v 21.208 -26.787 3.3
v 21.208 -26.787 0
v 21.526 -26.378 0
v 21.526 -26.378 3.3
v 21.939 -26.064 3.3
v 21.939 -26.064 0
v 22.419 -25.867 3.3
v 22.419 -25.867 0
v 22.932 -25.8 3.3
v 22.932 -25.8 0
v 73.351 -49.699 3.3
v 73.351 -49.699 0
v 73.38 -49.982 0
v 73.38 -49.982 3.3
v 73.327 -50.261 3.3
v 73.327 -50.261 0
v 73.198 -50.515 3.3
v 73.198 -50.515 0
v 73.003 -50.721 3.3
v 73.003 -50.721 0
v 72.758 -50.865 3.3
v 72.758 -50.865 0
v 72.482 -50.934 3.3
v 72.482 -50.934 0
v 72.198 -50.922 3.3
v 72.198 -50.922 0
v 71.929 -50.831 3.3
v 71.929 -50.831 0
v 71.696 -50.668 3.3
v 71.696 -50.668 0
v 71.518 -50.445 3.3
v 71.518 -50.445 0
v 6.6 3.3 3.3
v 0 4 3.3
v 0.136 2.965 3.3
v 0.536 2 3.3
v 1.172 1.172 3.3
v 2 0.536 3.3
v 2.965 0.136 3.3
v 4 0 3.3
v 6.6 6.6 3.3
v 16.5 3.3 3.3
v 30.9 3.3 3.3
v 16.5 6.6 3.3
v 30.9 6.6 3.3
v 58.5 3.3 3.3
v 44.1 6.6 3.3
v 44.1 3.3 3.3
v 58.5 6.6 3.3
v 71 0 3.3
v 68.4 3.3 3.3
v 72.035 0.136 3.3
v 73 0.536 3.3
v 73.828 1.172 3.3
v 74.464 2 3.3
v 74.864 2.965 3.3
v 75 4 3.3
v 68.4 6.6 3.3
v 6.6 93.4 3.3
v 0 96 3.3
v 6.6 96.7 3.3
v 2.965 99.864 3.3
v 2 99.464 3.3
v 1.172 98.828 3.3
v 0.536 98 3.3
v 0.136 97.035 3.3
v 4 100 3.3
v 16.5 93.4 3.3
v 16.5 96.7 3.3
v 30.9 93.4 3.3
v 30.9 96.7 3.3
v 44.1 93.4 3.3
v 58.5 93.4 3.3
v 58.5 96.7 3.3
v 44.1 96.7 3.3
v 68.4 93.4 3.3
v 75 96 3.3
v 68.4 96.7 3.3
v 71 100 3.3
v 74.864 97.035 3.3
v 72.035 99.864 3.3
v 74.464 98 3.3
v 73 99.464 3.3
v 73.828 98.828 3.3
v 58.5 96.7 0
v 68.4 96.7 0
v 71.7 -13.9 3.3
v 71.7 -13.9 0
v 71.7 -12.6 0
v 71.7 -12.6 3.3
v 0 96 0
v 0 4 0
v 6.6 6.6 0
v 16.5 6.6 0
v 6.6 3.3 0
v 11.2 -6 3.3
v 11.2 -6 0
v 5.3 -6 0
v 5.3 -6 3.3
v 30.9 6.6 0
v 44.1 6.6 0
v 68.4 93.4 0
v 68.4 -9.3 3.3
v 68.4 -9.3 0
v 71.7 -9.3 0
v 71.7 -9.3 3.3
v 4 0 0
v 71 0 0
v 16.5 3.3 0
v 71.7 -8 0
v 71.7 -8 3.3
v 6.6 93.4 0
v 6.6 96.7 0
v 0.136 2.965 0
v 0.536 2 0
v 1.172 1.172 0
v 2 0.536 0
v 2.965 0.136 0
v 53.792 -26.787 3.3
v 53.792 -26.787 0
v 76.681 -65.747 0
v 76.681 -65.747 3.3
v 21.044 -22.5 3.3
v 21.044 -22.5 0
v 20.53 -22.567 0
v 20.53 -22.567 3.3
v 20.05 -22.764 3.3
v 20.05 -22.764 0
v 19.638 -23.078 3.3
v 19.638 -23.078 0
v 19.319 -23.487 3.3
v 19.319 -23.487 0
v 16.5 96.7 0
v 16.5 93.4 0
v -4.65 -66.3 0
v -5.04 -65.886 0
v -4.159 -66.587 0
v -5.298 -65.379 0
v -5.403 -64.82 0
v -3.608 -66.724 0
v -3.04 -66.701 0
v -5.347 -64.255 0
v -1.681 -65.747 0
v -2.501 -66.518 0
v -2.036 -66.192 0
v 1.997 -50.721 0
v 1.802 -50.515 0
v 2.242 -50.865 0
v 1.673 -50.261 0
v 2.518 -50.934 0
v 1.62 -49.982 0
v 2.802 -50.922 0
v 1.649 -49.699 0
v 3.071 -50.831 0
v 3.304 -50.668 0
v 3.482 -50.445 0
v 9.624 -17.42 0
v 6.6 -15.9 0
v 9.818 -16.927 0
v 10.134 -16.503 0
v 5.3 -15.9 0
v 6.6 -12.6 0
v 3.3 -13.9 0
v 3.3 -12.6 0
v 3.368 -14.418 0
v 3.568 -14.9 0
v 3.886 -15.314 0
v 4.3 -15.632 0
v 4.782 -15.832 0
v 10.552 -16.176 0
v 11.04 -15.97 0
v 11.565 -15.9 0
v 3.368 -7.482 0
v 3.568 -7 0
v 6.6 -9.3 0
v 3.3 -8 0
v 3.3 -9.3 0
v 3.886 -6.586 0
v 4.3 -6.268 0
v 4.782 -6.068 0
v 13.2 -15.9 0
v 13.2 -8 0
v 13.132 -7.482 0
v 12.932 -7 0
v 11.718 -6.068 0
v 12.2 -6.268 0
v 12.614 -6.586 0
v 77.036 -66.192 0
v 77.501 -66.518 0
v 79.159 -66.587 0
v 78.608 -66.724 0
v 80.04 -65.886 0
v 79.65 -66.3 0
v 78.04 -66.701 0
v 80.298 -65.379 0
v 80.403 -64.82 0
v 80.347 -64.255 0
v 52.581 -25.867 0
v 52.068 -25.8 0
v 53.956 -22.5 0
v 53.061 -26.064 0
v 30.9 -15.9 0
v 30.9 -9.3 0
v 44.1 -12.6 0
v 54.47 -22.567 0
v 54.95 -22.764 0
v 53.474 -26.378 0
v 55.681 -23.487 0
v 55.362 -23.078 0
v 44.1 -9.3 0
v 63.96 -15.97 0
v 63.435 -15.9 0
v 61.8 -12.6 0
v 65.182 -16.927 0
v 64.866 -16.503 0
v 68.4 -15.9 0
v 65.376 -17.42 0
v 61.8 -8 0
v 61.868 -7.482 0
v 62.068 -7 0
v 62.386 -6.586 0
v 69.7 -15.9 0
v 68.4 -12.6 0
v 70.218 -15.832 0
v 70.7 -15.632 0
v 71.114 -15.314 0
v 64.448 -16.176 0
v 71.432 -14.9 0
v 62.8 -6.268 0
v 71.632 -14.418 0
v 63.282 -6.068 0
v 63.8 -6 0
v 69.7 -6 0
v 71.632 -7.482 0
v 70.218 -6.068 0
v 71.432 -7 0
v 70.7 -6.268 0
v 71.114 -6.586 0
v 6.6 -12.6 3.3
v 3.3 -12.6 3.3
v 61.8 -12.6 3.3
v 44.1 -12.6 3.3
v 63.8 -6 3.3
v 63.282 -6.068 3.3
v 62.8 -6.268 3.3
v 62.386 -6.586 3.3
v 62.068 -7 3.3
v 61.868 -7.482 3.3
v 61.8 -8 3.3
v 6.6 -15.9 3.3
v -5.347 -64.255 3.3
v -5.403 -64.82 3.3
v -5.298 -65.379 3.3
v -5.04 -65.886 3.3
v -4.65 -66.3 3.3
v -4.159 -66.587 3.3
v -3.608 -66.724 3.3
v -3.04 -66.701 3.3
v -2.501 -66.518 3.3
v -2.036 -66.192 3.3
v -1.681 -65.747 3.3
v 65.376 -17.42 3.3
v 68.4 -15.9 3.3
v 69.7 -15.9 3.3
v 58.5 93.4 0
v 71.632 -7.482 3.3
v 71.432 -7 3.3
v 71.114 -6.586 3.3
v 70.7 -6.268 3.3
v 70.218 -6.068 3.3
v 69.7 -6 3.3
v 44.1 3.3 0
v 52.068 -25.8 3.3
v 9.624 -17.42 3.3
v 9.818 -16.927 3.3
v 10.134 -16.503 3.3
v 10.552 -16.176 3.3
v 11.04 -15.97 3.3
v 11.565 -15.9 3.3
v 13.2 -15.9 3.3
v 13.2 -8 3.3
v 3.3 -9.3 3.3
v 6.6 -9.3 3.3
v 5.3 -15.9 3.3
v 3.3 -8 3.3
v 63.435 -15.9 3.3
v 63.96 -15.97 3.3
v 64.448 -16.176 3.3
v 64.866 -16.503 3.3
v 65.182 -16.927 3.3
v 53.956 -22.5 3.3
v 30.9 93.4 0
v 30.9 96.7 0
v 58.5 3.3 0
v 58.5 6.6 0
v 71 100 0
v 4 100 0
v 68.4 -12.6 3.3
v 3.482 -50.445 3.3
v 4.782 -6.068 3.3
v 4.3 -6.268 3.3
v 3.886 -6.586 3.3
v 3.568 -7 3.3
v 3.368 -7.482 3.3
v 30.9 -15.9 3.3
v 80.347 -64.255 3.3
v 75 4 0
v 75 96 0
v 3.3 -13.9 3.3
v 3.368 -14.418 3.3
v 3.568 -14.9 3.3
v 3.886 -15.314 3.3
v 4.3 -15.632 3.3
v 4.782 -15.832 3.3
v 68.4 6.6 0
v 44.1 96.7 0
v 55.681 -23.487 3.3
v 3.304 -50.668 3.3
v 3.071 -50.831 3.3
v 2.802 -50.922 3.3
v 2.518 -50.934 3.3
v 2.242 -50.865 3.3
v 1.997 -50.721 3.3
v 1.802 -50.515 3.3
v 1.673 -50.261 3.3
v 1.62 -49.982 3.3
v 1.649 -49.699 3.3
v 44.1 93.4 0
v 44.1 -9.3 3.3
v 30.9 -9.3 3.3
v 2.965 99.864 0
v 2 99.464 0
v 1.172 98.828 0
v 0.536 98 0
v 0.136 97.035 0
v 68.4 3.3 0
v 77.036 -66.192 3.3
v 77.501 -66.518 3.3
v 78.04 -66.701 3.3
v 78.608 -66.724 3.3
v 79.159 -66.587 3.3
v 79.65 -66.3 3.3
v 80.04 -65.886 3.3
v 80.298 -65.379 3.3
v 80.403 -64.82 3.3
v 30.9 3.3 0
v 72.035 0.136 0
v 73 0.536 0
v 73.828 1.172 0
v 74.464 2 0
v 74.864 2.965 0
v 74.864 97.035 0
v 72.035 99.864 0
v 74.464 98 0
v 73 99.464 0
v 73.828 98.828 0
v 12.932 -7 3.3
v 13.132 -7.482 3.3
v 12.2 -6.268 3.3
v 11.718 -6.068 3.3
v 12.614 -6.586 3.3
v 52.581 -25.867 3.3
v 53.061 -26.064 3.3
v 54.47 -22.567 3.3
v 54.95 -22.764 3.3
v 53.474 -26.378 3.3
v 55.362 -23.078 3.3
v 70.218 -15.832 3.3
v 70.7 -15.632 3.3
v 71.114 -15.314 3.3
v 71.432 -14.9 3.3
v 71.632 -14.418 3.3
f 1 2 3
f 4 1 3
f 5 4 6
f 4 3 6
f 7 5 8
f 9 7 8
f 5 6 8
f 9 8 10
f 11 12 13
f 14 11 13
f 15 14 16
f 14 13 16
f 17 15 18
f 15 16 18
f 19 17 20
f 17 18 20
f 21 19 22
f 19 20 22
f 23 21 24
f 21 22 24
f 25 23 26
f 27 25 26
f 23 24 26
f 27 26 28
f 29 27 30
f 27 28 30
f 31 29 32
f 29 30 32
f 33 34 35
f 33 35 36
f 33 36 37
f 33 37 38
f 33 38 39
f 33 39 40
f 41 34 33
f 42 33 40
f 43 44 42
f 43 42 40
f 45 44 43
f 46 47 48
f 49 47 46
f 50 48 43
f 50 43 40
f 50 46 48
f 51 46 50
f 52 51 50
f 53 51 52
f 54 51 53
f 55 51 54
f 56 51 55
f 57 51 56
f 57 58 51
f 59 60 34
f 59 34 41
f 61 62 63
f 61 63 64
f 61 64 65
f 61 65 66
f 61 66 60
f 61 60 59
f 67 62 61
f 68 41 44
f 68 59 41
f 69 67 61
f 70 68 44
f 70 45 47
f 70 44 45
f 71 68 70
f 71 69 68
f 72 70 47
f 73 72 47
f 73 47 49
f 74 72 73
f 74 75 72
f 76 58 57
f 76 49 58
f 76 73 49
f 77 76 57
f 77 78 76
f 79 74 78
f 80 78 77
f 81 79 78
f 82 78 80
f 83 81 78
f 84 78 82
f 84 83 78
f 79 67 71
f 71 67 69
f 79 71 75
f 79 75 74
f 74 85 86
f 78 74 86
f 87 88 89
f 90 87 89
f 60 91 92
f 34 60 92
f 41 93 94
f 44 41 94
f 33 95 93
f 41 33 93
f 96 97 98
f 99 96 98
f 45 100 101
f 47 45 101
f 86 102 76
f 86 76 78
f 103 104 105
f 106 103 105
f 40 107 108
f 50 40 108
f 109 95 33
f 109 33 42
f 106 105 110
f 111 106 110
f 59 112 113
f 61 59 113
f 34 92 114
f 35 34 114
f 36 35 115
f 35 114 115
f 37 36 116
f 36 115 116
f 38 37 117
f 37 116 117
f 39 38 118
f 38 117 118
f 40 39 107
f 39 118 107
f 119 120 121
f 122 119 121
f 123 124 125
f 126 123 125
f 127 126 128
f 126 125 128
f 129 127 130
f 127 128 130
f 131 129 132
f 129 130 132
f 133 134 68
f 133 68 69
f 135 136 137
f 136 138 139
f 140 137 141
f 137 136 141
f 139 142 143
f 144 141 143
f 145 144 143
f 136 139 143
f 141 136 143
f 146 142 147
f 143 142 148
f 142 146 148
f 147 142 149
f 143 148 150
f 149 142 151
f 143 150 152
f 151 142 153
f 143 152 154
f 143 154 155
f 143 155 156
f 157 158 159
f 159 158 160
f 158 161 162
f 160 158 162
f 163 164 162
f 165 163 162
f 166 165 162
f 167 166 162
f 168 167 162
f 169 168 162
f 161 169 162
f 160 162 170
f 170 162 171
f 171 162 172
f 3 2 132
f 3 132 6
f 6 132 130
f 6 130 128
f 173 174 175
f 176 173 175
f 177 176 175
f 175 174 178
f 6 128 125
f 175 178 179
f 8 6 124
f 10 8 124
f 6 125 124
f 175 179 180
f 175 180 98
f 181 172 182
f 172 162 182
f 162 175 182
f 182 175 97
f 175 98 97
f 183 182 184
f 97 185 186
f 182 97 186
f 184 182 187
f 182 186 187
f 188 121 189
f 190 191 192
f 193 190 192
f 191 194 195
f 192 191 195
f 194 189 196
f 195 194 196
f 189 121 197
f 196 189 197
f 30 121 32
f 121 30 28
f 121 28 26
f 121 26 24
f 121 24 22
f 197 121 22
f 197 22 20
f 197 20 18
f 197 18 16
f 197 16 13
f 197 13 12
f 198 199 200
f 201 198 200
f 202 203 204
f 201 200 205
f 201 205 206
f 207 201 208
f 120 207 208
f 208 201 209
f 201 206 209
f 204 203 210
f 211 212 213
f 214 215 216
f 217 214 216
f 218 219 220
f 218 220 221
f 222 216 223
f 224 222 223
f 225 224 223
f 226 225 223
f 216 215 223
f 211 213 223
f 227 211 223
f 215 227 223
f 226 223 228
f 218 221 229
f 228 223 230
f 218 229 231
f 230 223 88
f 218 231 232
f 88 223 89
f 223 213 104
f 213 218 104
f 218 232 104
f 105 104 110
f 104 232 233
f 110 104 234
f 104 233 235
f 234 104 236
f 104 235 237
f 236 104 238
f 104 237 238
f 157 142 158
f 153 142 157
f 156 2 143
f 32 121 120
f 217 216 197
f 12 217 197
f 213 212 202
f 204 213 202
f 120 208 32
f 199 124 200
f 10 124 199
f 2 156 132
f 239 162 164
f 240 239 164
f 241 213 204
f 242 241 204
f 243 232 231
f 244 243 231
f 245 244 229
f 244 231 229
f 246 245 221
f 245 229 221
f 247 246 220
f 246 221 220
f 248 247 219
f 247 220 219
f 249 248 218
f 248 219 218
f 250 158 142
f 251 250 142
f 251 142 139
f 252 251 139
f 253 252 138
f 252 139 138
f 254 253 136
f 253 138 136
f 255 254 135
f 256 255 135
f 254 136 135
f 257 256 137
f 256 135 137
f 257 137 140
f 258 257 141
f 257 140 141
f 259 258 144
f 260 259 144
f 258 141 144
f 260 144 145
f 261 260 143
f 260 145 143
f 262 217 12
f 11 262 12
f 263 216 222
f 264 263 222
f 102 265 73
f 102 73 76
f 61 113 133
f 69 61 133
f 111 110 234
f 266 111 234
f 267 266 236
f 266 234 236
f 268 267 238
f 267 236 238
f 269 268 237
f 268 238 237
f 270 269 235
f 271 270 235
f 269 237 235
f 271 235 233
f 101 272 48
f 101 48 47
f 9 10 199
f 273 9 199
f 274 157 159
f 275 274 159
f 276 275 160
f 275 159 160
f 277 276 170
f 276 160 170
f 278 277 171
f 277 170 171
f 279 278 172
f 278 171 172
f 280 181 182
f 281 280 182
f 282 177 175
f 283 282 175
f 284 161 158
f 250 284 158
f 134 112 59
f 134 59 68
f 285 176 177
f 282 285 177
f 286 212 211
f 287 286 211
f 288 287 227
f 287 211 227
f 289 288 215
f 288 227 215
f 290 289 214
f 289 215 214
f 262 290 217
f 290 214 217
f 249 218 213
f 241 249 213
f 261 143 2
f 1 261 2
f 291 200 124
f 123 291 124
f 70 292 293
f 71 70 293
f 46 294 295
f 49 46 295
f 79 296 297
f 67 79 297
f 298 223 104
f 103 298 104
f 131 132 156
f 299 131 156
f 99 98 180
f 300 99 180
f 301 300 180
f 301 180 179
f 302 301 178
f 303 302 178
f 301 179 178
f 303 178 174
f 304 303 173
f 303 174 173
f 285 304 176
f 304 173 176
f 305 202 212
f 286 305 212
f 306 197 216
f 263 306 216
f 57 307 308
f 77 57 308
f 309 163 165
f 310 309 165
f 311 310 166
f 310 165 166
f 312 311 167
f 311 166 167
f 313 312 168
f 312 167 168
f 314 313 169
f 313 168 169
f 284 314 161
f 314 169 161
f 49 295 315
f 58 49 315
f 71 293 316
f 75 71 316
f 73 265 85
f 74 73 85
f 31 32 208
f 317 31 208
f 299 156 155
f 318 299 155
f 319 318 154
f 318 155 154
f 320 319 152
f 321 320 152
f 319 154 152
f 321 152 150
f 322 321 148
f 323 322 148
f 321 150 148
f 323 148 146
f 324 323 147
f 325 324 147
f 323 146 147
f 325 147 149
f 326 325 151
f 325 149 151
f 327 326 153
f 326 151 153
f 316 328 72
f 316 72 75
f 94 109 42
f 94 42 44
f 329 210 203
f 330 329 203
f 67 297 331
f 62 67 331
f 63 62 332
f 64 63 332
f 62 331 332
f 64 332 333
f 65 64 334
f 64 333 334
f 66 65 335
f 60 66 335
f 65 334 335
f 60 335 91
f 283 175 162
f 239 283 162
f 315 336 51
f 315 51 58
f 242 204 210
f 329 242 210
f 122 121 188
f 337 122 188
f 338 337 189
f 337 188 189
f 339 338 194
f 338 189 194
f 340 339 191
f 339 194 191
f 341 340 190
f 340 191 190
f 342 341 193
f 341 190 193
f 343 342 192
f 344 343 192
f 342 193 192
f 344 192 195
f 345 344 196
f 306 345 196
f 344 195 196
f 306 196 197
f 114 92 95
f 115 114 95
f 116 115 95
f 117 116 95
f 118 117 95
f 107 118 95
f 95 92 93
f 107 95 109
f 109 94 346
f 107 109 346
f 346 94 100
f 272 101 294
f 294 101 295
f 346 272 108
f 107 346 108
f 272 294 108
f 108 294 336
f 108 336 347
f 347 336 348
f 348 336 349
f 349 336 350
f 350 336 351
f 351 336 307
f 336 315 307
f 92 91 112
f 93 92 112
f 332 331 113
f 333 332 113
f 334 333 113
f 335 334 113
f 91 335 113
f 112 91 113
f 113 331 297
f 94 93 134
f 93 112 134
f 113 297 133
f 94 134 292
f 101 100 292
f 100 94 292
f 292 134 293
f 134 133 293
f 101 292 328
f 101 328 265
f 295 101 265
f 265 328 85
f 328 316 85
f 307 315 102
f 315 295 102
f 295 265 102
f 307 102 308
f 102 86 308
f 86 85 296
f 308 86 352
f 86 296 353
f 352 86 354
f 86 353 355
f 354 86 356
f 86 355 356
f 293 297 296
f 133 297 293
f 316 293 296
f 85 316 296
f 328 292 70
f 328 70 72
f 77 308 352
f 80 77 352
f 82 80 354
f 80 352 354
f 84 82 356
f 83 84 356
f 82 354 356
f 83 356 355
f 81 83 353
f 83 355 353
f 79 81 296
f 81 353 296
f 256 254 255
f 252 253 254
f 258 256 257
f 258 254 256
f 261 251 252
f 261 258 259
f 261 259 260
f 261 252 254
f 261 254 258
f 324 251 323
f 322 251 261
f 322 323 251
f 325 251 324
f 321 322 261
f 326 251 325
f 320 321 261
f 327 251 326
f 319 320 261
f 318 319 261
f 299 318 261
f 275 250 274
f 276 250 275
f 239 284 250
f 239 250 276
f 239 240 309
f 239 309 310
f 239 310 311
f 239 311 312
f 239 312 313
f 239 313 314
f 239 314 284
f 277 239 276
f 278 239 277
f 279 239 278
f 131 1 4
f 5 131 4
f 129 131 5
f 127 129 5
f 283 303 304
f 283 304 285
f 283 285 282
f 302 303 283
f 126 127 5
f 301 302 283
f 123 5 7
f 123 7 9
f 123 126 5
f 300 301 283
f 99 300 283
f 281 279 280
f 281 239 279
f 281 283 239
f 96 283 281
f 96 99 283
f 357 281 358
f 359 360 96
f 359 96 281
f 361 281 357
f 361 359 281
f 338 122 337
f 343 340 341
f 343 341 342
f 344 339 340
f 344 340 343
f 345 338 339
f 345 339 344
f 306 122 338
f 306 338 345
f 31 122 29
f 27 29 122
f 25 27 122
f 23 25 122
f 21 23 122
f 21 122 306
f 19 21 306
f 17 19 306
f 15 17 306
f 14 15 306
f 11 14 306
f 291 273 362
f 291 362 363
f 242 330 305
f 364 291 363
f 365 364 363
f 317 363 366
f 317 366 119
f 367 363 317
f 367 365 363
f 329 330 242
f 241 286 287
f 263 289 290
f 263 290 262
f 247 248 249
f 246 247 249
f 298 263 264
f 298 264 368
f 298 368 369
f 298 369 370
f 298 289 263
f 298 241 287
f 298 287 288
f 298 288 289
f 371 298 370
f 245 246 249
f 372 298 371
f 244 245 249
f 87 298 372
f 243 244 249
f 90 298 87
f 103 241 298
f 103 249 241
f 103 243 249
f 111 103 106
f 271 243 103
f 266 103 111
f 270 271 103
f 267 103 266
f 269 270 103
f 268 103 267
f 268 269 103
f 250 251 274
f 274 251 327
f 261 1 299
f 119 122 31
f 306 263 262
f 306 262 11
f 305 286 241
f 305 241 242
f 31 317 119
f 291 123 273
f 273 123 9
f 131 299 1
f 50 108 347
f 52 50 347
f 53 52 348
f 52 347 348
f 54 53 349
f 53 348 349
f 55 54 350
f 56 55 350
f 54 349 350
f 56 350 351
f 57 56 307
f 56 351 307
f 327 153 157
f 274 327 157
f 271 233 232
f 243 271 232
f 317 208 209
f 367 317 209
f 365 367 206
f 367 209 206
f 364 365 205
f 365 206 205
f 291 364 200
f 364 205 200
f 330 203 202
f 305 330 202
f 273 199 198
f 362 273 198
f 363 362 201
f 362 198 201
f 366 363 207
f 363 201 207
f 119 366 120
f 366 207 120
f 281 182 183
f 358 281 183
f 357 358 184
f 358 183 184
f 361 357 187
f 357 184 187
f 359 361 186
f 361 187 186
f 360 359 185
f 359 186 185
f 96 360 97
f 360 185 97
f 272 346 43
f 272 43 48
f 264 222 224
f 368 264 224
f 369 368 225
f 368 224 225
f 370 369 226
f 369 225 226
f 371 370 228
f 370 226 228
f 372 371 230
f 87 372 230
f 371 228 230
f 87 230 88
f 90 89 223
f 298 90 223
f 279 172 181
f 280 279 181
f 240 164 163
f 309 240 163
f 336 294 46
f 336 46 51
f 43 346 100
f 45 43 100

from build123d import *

# Parameters (mm, degrees)
F2_DEPTH = 3.3
F1_W     = 9.9
F1_H     = 3.3
F1_W_2   = 13.2


with BuildPart() as f2:
    # F1 (on Top) → F2 (new body)
    with BuildSketch(Plane.XY):
        with BuildLine():
            Line((5.3, -15.9), (6.6, -15.9))
            Line((6.6, -15.9), (-5.3468506697, -64.2546372373))
            ThreePointArc((-5.3468506697, -64.2546372373), (-4.1594884882, -66.5866700606), (-1.6808025264, -65.7474311544))
            Line((-1.6808025264, -65.7474311544), (21.2080626707, -26.7869162912))
            ThreePointArc((21.2080626707, -26.7869162912), (21.9390568106, -26.0641763601), (22.9324934171, -25.8))
            Line((22.9324934171, -25.8), (37.5, -25.8))
            Line((37.5, -25.8), (52.0675065829, -25.8))
            ThreePointArc((52.0675065829, -25.8), (53.0609431894, -26.0641763601), (53.7919373293, -26.7869162912))
            Line((53.7919373293, -26.7869162912), (76.6808025264, -65.7474311544))
            ThreePointArc((76.6808025264, -65.7474311544), (79.1594884882, -66.5866700606), (80.3468506697, -64.2546372373))
            Line((80.3468506697, -64.2546372373), (68.4, -15.9))
            Line((68.4, -15.9), (69.7, -15.9))
            ThreePointArc((69.7, -15.9), (71.1142135624, -15.3142135624), (71.7, -13.9))
            Line((71.7, -13.9), (71.7, -12.6))
            Line((71.7, -12.6), (68.4, -12.6))
            Line((68.4, -12.6), (68.4, -9.3))
            Line((68.4, -9.3), (71.7, -9.3))
            Line((71.7, -9.3), (71.7, -8))
            ThreePointArc((71.7, -8), (71.1142135624, -6.5857864376), (69.7, -6))
            Line((69.7, -6), (63.8, -6))
            ThreePointArc((63.8, -6), (62.3857864376, -6.5857864376), (61.8, -8))
            Line((61.8, -8), (61.8, -12.6))
            Line((61.8, -12.6), (44.1, -12.6))
            Line((44.1, -12.6), (44.1, -9.3))
            Line((44.1, -9.3), (37.5, -9.3))
            Line((37.5, -9.3), (30.9, -9.3))
            Line((30.9, -9.3), (30.9, -12.6))
            Line((30.9, -12.6), (30.9, -15.9))
            Line((30.9, -15.9), (37.5, -15.9))
            Line((37.5, -15.9), (63.4347686425, -15.9))
            ThreePointArc((63.4347686425, -15.9), (64.6677689636, -16.3252904369), (65.3763860395, -17.4202897918))
            Line((65.3763860395, -17.4202897918), (73.3513984887, -49.6989919039))
            ThreePointArc((73.3513984887, -49.6989919039), (72.7577173979, -50.8650083155), (71.518374417, -50.4453888624))
            Line((71.518374417, -50.4453888624), (55.6805743579, -23.4869162912))
            ThreePointArc((55.6805743579, -23.4869162912), (54.9495802181, -22.7641763601), (53.9561436116, -22.5))
            Line((53.9561436116, -22.5), (37.5, -22.5))
            Line((37.5, -22.5), (21.0438563884, -22.5))
            ThreePointArc((21.0438563884, -22.5), (20.0504197819, -22.7641763601), (19.3194256421, -23.4869162912))
            Line((19.3194256421, -23.4869162912), (3.481625583, -50.4453888624))
            ThreePointArc((3.481625583, -50.4453888624), (2.2422826021, -50.8650083155), (1.6486015113, -49.6989919039))
            Line((1.6486015113, -49.6989919039), (9.6236139605, -17.4202897918))
            ThreePointArc((9.6236139605, -17.4202897918), (10.3322310364, -16.3252904369), (11.5652313575, -15.9))
            Line((11.5652313575, -15.9), (13.2, -15.9))
            Line((13.2, -15.9), (13.2, -12.6))
            Line((13.2, -12.6), (13.2, -8))
            ThreePointArc((13.2, -8), (12.6142135624, -6.5857864376), (11.2, -6))
            Line((11.2, -6), (5.3, -6))
            ThreePointArc((5.3, -6), (3.8857864376, -6.5857864376), (3.3, -8))
            Line((3.3, -8), (3.3, -9.3))
            Line((3.3, -9.3), (6.6, -9.3))
            Line((6.6, -9.3), (6.6, -12.6))
            Line((6.6, -12.6), (3.3, -12.6))
            Line((3.3, -12.6), (3.3, -13.9))
            ThreePointArc((3.3, -13.9), (3.8857864376, -15.3142135624), (5.3, -15.9))
        make_face()
    extrude(amount=F2_DEPTH)


with BuildPart() as f2b:
    # F1 (on Top) → F2, piece 2 (new body)
    with BuildSketch(Plane.XY):
        with BuildLine():
            Line((0, 96), (0, 4))
            ThreePointArc((0, 4), (1.1715728753, 1.1715728753), (4, 0))
            Line((4, 0), (71, 0))
            ThreePointArc((71, 0), (73.8284271247, 1.1715728753), (75, 4))
            Line((75, 4), (75, 96))
            ThreePointArc((75, 96), (73.8284271247, 98.8284271247), (71, 100))
            Line((71, 100), (4, 100))
            ThreePointArc((4, 100), (1.1715728753, 98.8284271247), (0, 96))
        make_face()
        with Locations((11.55, 4.95)):
            Rectangle(F1_W, F1_H, mode=Mode.SUBTRACT)
        with Locations((37.5, 4.95)):
            Rectangle(F1_W_2, F1_H, mode=Mode.SUBTRACT)
        with Locations((63.45, 4.95)):
            Rectangle(F1_W, F1_H, mode=Mode.SUBTRACT)
        with Locations((11.55, 95.05)):
            Rectangle(F1_W, F1_H, mode=Mode.SUBTRACT)
        with Locations((37.5, 95.05)):
            Rectangle(F1_W_2, F1_H, mode=Mode.SUBTRACT)
        with Locations((63.45, 95.05)):
            Rectangle(F1_W, F1_H, mode=Mode.SUBTRACT)
    extrude(amount=F2_DEPTH)


solid = Compound([f2.part, f2b.part])
